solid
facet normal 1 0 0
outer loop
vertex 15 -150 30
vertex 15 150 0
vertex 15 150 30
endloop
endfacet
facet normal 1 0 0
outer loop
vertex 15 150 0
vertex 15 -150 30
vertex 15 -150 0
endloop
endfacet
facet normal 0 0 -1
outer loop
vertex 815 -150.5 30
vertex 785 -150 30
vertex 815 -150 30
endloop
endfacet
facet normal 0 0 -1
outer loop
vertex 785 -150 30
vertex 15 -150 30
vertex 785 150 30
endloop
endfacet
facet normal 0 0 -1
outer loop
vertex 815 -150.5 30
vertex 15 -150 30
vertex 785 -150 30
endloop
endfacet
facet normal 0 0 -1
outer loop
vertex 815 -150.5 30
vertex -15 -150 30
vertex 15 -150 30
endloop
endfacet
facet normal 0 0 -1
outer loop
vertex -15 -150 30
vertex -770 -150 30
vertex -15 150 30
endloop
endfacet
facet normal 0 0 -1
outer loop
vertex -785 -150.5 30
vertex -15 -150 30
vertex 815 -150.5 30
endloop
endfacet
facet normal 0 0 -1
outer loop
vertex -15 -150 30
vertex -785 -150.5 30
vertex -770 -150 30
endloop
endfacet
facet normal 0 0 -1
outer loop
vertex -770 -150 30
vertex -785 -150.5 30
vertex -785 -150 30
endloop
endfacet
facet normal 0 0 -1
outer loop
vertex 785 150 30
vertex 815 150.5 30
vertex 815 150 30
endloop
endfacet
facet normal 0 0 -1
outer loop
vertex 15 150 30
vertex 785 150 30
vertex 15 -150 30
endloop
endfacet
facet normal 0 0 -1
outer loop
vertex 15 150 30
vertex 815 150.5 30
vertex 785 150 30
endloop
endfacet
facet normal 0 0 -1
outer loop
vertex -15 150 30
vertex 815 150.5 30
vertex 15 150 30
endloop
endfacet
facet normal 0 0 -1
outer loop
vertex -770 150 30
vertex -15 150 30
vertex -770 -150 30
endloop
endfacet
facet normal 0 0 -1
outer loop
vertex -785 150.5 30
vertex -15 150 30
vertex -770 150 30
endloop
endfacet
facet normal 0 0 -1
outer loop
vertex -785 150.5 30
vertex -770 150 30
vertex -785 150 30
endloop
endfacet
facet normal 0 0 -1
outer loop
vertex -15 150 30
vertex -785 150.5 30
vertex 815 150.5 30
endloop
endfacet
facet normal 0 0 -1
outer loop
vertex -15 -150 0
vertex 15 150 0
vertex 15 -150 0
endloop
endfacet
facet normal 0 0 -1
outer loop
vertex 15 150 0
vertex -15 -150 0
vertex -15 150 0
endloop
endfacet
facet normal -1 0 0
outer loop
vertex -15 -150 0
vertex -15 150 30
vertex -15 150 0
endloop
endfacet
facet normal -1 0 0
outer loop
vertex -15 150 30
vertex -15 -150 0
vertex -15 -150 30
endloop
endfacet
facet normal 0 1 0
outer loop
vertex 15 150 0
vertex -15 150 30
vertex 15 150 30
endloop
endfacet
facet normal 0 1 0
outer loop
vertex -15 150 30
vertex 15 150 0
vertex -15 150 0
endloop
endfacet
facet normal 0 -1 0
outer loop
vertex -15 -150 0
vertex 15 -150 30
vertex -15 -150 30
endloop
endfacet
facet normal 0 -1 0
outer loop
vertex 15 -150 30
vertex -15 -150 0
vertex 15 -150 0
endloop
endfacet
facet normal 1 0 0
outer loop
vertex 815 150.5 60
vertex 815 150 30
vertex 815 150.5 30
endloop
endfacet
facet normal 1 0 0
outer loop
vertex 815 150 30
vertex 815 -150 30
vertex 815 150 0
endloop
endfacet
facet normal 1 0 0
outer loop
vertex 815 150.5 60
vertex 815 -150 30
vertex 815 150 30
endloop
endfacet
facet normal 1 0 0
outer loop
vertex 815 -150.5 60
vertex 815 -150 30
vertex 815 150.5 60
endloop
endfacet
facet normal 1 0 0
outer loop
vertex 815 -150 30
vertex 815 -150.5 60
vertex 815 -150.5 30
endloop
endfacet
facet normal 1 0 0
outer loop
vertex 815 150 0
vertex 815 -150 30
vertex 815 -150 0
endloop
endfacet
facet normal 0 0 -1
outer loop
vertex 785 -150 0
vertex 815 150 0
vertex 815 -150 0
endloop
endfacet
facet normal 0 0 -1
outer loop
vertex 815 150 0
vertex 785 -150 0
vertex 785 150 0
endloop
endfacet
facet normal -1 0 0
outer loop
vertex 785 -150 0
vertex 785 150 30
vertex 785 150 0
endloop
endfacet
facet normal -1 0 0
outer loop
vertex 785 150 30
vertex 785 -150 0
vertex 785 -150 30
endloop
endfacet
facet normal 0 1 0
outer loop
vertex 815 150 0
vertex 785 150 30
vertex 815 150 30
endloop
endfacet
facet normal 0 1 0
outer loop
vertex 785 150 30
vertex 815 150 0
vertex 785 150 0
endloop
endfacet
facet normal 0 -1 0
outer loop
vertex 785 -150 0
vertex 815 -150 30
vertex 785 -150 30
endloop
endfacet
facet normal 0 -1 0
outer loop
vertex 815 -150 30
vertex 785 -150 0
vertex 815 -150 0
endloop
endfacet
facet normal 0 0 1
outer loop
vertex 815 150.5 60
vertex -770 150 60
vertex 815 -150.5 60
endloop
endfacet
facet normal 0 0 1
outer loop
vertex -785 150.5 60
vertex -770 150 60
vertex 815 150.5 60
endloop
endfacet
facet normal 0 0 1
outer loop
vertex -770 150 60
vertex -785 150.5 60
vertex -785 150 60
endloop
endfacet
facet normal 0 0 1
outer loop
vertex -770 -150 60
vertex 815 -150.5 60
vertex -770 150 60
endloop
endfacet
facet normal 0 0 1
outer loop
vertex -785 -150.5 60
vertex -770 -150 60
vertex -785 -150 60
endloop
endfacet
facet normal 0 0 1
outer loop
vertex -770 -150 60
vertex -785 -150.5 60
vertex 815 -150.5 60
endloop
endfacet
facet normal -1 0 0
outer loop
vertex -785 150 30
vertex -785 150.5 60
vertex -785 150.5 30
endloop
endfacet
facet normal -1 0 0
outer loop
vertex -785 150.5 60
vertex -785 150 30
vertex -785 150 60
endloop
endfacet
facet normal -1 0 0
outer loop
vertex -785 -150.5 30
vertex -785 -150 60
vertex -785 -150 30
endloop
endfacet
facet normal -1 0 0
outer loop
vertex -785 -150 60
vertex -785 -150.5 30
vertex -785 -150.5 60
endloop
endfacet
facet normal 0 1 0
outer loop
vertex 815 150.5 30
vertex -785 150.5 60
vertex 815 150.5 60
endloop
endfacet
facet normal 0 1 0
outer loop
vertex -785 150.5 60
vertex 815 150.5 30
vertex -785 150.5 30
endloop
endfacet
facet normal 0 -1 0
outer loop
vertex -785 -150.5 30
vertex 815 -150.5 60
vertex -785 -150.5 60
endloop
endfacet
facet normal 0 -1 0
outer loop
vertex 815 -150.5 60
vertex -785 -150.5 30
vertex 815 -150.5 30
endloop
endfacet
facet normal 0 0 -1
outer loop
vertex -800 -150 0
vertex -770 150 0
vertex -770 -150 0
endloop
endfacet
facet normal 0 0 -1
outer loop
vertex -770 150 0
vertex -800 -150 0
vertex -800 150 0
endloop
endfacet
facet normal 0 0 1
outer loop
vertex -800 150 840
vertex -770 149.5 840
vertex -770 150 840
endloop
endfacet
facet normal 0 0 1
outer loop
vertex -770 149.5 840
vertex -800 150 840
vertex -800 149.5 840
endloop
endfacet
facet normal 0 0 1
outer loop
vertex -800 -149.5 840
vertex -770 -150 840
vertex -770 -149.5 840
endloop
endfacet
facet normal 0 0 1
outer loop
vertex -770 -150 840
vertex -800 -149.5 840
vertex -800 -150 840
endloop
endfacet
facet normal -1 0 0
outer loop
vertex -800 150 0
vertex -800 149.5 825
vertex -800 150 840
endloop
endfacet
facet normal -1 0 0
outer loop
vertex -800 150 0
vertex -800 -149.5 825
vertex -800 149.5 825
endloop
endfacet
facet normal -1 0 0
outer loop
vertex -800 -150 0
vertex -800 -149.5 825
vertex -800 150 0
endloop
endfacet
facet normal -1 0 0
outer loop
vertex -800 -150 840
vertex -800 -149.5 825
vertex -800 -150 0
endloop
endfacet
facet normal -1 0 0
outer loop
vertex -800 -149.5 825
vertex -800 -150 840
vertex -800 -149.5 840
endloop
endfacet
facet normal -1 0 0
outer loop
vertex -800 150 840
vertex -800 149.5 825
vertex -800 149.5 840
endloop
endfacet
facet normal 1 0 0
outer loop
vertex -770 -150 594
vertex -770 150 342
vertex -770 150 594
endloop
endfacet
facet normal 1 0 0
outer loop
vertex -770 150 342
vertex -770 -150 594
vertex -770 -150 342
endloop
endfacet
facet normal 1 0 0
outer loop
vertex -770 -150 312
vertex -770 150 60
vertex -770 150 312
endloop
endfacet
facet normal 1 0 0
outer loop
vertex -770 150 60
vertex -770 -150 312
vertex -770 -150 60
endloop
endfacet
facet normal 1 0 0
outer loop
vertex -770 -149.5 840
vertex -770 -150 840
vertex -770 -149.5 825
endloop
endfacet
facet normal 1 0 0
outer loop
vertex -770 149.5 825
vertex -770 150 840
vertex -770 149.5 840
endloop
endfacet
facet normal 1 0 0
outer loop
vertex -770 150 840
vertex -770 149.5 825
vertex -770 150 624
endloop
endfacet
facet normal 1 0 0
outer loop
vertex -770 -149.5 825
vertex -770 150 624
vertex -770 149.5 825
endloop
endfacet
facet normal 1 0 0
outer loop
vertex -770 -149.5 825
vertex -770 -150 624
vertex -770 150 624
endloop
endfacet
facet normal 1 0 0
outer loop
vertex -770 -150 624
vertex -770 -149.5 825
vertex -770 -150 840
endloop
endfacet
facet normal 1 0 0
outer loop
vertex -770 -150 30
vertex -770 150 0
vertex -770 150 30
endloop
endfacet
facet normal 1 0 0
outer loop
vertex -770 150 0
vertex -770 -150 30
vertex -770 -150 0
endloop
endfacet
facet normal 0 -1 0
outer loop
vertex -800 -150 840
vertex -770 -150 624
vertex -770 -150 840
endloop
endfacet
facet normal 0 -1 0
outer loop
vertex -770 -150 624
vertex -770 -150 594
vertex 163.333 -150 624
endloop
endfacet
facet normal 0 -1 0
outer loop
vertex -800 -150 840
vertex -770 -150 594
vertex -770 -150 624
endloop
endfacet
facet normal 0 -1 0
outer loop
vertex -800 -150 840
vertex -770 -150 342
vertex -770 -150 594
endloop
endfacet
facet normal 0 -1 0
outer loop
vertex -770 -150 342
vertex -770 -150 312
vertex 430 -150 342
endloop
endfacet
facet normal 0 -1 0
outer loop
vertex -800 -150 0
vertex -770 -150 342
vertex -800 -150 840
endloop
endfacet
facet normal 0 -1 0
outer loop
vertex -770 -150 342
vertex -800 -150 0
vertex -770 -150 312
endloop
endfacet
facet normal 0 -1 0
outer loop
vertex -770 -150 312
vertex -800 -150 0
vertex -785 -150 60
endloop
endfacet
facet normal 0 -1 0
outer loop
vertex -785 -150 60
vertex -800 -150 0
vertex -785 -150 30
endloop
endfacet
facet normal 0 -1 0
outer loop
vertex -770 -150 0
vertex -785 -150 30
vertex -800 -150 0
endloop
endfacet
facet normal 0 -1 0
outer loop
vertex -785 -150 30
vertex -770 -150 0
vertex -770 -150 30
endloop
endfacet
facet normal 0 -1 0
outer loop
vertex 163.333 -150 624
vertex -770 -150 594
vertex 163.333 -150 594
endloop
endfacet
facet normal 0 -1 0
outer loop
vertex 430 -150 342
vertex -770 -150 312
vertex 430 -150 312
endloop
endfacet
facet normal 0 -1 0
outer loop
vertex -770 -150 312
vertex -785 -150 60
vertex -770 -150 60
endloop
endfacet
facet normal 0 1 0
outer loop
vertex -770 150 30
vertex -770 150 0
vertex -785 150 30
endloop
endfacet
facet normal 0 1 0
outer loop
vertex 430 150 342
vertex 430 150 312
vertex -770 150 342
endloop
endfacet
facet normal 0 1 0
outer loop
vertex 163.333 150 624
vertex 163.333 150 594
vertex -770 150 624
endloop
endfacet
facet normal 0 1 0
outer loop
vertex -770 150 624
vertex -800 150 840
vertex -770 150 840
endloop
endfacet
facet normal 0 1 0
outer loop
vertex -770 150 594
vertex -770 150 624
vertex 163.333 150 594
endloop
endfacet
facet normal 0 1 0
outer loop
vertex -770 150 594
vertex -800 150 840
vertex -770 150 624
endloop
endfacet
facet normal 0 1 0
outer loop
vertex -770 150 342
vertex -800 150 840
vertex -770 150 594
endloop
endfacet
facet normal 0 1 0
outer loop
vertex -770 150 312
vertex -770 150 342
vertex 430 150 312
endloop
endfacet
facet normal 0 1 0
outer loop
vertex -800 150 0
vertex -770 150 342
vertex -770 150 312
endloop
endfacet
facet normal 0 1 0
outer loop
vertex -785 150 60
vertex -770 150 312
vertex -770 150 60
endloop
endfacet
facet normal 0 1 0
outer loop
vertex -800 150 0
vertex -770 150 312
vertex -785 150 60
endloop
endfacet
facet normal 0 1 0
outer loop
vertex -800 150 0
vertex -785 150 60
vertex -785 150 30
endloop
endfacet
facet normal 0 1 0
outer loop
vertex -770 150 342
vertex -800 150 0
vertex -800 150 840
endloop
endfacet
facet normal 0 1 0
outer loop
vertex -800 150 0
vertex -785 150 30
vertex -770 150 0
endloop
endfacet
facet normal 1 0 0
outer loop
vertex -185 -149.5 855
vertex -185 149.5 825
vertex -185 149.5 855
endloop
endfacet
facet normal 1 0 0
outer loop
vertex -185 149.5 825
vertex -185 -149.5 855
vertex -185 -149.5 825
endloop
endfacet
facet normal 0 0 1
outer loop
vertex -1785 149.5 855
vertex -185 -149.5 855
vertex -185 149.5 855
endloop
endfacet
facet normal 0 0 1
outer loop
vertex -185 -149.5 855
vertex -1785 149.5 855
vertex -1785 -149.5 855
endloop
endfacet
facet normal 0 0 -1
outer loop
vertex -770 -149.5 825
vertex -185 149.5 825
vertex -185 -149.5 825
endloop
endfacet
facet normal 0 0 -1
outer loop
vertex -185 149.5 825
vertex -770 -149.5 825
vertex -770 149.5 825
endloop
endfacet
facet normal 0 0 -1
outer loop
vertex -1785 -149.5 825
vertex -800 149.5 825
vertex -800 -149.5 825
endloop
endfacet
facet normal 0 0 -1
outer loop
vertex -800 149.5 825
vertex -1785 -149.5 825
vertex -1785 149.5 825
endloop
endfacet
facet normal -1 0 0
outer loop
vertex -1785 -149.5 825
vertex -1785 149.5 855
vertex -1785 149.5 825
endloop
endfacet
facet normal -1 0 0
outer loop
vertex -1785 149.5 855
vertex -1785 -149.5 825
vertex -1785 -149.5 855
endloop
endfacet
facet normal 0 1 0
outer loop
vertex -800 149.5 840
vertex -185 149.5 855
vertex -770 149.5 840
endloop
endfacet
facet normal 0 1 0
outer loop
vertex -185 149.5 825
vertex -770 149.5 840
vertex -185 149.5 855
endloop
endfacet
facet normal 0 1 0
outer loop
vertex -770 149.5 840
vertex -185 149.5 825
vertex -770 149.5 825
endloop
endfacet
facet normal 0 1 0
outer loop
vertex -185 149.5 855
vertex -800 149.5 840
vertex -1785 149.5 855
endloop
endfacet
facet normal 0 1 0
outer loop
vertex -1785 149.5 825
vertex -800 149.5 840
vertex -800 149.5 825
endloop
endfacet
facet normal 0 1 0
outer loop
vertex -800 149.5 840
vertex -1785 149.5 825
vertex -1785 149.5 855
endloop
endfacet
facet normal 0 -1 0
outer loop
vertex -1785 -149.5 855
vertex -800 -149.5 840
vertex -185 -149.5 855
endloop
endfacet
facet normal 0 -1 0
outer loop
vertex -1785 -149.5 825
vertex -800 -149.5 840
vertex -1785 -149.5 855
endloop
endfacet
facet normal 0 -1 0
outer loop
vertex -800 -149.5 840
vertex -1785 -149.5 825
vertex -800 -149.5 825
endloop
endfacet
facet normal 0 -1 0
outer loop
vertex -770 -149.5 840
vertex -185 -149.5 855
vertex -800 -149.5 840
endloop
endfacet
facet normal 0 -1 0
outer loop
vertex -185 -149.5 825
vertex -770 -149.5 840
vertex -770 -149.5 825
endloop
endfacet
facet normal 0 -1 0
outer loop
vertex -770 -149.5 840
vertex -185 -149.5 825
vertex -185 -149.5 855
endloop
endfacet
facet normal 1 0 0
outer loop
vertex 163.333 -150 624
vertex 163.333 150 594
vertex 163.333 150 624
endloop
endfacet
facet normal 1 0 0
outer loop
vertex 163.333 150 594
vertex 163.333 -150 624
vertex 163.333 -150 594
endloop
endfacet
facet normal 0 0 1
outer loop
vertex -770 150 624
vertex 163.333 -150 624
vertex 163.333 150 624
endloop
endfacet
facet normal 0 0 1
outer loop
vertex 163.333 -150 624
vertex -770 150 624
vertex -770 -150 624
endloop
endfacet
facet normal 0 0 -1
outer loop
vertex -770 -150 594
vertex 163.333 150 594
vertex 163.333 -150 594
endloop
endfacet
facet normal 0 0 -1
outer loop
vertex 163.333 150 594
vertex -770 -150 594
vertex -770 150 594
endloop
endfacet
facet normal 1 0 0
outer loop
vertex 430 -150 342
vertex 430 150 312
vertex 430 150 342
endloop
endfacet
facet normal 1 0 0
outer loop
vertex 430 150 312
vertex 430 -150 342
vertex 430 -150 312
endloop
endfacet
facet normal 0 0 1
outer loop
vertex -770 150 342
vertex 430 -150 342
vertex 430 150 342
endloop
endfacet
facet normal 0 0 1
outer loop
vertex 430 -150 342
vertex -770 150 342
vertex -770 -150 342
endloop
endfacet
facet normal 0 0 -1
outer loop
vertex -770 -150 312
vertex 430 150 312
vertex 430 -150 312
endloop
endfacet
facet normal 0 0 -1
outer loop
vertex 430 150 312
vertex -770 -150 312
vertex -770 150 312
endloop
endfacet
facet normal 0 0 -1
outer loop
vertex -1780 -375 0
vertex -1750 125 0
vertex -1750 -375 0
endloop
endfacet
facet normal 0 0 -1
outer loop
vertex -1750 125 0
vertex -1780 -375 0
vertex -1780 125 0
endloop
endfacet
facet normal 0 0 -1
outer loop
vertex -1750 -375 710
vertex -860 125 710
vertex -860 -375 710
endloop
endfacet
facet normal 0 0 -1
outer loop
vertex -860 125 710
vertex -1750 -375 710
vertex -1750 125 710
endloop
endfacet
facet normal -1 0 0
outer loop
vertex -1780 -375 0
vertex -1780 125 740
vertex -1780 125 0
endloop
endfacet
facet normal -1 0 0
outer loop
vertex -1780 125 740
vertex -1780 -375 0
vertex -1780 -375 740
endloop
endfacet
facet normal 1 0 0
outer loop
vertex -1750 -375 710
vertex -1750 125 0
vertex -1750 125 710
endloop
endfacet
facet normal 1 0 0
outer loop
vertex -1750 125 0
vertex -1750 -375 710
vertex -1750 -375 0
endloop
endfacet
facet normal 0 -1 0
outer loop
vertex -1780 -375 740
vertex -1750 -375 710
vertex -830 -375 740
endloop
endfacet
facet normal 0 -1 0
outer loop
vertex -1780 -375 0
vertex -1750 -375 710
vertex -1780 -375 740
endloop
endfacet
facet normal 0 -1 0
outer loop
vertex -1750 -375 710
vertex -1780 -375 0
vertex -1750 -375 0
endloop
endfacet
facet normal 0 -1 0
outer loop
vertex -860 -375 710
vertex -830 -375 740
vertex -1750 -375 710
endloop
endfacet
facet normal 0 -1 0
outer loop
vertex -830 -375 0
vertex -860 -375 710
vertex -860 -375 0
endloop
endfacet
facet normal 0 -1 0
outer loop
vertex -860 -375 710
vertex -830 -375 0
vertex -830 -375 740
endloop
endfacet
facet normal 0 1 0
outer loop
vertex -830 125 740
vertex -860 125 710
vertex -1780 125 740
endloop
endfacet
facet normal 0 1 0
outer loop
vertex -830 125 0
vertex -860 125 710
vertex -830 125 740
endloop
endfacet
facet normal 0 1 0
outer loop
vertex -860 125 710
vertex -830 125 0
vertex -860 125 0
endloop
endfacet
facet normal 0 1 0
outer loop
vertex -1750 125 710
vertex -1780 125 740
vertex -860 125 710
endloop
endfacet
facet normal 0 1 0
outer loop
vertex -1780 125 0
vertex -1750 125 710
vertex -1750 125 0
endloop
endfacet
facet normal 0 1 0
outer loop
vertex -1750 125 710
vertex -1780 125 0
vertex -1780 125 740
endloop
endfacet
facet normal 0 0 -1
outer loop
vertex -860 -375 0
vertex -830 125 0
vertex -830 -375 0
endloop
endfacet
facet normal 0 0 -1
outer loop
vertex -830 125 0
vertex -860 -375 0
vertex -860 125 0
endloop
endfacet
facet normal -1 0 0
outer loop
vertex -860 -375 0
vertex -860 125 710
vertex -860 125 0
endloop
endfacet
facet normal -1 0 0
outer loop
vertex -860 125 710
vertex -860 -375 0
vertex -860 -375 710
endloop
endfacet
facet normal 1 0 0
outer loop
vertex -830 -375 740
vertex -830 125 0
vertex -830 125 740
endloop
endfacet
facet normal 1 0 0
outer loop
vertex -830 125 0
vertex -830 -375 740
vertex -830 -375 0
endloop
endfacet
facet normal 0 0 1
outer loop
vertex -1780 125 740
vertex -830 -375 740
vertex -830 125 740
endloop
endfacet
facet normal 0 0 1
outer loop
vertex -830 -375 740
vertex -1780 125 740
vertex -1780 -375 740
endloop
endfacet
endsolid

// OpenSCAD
module board(width=1000, height=30, depth=300) {
  cube([width, depth, height], true);
}

module align_left(width, base_width) {
  translate([-base_width/2 + 30/2, 0]) rotate([0, -90]) translate([width/2 + 30/2, 0]) children();
}

module align_right(width, base_width) {
  translate([base_width/2 - 30/2, 0]) rotate([0, -90]) translate([width/2 + 30/2, 0]) children();
}

module left_vertical_board(width, base_width) {
  align_left(width=width, base_width=base_width) {
    board(width=width);
  }
}

module right_vertical_board(width, base_width) {
  align_right(width=600, base_width=2000) {
    board(width=600);
  }
}

translate([0, 0, 30/2]) {
  translate([0, 0]) board(width=30);
  translate([800, 0]) board(width=30);
}

translate([0, 0, 30 + 30/2]) {
  // base
  translate([30/2, 0]) board(width=1600, depth=300 + 1);

  w = 710 + 30 + 100;
  // support
  color([1, 0, 0]) translate([0, 0, -30*2]) left_vertical_board(width=w, base_width=1600);
  translate([-800 - 200 + 30/2, 0, w - 30 - 30/2]) board(width=1600, depth=300 - 1);

  translate([-1600 * 5/24 + 30, 0, 846 * 2/3]) board(width=1600 * 7/12);
  translate([-1600 * 3/24 + 30, 0, 846 * 1/3]) board(width=1600 * 9/12);
}

translate([-1305, 0, 710/2]) {
  translate([-950/2 + 30/2, -500/4]) rotate([0, -90]) board(width=710, depth=500);
  translate([950/2 - 30/2, -500/4]) rotate([0, -90]) board(width=710, depth=500);
  translate([0, -500/4, 710/2 + 30/2]) board(width=950, depth=500);
}
